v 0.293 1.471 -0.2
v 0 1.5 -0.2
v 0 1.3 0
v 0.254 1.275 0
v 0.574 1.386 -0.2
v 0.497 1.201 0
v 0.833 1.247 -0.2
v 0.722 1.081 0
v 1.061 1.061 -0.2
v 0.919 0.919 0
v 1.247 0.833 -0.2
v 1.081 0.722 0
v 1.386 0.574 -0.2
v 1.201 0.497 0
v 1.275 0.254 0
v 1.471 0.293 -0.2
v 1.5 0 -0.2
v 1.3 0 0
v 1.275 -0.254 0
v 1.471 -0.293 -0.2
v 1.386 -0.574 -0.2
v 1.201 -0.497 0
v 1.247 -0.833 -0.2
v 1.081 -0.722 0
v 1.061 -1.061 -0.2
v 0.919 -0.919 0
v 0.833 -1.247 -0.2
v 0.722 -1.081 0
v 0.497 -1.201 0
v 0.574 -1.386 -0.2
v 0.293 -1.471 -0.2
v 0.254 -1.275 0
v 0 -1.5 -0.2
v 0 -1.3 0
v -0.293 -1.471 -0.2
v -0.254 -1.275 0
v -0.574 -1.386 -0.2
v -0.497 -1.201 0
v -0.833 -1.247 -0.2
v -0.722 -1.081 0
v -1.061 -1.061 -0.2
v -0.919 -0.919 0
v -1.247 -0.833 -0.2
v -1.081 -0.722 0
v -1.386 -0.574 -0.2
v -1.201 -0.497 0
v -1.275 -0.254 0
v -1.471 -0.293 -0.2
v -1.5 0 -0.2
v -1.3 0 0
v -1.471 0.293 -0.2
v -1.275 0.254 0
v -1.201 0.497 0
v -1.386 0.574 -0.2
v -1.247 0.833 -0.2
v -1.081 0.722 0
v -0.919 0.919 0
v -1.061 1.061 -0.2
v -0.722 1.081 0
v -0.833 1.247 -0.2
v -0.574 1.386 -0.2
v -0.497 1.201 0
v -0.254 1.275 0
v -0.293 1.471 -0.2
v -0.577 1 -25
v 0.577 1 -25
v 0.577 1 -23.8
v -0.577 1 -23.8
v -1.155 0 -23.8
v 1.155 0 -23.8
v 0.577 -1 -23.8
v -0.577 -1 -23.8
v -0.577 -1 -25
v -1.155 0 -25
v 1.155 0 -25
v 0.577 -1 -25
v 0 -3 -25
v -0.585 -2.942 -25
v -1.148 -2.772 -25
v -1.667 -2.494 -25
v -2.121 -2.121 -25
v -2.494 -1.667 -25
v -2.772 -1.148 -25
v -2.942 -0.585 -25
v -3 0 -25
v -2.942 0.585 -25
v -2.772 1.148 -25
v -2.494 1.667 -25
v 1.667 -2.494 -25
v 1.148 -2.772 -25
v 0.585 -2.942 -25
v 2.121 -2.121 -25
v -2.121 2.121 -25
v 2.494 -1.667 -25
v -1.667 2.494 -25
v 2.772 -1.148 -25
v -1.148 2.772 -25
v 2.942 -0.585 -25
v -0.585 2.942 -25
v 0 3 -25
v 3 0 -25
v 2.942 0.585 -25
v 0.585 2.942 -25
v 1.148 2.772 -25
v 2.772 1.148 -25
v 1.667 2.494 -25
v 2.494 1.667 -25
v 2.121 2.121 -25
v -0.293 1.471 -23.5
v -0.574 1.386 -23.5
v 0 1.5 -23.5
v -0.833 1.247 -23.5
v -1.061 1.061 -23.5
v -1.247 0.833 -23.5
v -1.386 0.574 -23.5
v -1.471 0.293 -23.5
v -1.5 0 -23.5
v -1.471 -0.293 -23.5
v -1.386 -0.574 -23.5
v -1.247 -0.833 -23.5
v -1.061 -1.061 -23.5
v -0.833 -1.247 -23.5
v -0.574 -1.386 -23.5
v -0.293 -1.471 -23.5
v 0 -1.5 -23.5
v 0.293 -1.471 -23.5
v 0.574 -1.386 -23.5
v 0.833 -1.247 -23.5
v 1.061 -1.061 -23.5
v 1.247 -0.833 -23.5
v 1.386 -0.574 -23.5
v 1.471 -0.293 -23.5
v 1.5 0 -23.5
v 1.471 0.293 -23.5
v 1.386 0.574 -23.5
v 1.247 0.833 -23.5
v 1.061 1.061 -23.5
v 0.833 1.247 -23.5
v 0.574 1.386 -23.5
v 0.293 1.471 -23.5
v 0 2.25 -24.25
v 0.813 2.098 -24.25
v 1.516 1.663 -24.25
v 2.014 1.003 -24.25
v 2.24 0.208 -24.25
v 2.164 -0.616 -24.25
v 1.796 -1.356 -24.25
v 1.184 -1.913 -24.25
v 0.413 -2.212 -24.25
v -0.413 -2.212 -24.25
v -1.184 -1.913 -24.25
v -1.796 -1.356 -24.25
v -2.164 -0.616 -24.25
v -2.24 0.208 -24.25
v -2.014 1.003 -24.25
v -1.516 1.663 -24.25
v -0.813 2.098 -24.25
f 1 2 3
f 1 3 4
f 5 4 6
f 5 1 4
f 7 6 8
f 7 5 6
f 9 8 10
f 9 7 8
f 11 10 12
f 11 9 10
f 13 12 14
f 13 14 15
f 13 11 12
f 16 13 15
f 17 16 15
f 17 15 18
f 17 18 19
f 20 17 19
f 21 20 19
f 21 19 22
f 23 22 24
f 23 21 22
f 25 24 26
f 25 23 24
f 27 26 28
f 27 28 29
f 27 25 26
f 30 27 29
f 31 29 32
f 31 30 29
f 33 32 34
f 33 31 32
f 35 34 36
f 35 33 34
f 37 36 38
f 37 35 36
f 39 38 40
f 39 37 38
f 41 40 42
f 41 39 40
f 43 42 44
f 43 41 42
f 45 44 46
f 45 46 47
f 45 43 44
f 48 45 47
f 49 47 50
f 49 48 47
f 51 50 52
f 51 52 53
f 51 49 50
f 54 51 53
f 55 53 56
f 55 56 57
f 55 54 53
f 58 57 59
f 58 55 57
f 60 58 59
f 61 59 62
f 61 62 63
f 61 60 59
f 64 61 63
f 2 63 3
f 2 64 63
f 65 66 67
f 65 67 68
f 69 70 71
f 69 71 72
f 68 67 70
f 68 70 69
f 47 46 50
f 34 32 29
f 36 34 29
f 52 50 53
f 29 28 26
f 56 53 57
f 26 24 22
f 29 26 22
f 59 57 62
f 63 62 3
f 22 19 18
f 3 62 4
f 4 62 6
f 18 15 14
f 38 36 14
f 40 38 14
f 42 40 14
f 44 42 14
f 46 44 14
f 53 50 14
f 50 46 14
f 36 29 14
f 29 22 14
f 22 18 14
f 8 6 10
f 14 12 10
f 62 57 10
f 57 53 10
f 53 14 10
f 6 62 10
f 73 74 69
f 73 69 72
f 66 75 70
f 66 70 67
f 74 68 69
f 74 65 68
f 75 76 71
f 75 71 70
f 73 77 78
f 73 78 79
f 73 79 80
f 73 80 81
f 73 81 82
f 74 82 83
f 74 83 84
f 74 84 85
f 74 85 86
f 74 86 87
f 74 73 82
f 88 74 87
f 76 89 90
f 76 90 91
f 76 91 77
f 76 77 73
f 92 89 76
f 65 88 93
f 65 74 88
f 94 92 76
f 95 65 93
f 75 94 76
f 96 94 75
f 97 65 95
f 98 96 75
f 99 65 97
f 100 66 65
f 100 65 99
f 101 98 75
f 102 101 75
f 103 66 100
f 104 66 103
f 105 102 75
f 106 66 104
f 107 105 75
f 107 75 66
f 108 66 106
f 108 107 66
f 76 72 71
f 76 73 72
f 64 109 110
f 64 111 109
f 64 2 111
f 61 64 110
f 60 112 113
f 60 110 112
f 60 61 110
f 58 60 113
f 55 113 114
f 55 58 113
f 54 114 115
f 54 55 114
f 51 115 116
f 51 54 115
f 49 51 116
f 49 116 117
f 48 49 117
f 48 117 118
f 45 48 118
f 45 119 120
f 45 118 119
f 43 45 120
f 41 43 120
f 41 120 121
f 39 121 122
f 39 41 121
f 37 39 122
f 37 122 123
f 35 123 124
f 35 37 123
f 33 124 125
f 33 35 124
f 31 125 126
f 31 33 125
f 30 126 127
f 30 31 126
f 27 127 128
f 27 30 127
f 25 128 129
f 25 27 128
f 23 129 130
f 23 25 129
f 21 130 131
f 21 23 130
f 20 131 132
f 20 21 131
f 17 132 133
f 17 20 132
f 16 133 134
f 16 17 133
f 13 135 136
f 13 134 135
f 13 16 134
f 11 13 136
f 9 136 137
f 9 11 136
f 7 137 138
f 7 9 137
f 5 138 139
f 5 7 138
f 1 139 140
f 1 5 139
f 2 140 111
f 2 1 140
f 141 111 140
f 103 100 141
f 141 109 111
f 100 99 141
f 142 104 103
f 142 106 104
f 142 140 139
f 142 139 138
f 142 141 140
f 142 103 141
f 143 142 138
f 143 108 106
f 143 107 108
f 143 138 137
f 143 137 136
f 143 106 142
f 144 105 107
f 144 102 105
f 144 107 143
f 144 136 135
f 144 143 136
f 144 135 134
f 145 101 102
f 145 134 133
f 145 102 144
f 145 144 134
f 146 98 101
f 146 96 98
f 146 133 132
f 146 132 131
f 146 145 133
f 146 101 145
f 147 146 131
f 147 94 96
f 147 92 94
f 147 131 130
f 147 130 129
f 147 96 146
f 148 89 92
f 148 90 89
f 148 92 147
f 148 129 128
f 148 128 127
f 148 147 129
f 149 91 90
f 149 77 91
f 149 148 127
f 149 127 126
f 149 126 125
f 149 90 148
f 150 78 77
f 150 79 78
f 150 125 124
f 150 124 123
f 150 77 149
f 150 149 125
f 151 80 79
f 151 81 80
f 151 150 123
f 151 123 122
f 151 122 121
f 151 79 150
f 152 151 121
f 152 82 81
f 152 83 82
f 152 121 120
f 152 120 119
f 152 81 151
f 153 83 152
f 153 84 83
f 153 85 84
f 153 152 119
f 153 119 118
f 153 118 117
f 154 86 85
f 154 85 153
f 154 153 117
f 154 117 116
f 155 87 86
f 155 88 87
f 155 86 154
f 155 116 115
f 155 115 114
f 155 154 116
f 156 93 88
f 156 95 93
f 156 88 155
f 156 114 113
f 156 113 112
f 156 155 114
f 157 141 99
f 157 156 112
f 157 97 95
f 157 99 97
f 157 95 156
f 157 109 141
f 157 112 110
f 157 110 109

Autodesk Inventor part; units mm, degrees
ref_plane "YZ Plane" through (0, 0, 0) normal (1, 0, 0) x (0, 1, 0)
ref_plane "XZ Plane" through (0, 0, 0) normal (0, 1, 0) x (-1, 0, 0)
ref_plane "XY Plane" through (0, 0, 0) normal (0, 0, 1) x (1, 0, 0)
sketch "Sketch1" plane through (0, 0, 0) normal (1, 0, 0) x (0, 1, 0)
  line L0 (0, 0) -> (0, -25)
  line L1 (0, -25) -> (3, -25)
  line L2 (3, -25) -> (1.5, -23.5)
  line L3 (1.5, -23.5) -> (1.5, 0)
  line L4 (1.5, 0) -> (0, 0)
  dimension "d0" = 6
  dimension "d1" = 25
  dimension "d2" = 45
  dimension "d3" = 3
revolve "Revolution1" add sketch "Sketch1" angle 360 about axis through (0, 0, 0) along (0, 0, -1)
chamfer "Chamfer1" distance 0.2 angle 45 1 edges at (0, -1.5, 0)
thread "Thread1" size "M3x0.5" class "6g" standard "ANSI Metric M Profile" full length
sketch "Sketch2" plane through (0, 0, -25) normal (0, 0, -1) x (-1, 0, 0)
  circle A0 centre (0, 0) radius 1.3 projected
  line L0 (1.1547, 0) -> (0.5774, -1)
  line L1 (0.5774, -1) -> (-0.5774, -1)
  line L2 (-0.5774, -1) -> (-1.1547, 0)
  line L3 (-1.1547, 0) -> (-0.5774, 1)
  line L4 (-0.5774, 1) -> (0.5774, 1)
  line L5 (0.5774, 1) -> (1.1547, 0)
  dimension "d10" = 2
extrude "Extrusion1" cut sketch "Sketch2" against normal blind 1.2 contours L0 L1 L2 L3 L4 L5
properties part number "M3 x 25 mm FHCS"
